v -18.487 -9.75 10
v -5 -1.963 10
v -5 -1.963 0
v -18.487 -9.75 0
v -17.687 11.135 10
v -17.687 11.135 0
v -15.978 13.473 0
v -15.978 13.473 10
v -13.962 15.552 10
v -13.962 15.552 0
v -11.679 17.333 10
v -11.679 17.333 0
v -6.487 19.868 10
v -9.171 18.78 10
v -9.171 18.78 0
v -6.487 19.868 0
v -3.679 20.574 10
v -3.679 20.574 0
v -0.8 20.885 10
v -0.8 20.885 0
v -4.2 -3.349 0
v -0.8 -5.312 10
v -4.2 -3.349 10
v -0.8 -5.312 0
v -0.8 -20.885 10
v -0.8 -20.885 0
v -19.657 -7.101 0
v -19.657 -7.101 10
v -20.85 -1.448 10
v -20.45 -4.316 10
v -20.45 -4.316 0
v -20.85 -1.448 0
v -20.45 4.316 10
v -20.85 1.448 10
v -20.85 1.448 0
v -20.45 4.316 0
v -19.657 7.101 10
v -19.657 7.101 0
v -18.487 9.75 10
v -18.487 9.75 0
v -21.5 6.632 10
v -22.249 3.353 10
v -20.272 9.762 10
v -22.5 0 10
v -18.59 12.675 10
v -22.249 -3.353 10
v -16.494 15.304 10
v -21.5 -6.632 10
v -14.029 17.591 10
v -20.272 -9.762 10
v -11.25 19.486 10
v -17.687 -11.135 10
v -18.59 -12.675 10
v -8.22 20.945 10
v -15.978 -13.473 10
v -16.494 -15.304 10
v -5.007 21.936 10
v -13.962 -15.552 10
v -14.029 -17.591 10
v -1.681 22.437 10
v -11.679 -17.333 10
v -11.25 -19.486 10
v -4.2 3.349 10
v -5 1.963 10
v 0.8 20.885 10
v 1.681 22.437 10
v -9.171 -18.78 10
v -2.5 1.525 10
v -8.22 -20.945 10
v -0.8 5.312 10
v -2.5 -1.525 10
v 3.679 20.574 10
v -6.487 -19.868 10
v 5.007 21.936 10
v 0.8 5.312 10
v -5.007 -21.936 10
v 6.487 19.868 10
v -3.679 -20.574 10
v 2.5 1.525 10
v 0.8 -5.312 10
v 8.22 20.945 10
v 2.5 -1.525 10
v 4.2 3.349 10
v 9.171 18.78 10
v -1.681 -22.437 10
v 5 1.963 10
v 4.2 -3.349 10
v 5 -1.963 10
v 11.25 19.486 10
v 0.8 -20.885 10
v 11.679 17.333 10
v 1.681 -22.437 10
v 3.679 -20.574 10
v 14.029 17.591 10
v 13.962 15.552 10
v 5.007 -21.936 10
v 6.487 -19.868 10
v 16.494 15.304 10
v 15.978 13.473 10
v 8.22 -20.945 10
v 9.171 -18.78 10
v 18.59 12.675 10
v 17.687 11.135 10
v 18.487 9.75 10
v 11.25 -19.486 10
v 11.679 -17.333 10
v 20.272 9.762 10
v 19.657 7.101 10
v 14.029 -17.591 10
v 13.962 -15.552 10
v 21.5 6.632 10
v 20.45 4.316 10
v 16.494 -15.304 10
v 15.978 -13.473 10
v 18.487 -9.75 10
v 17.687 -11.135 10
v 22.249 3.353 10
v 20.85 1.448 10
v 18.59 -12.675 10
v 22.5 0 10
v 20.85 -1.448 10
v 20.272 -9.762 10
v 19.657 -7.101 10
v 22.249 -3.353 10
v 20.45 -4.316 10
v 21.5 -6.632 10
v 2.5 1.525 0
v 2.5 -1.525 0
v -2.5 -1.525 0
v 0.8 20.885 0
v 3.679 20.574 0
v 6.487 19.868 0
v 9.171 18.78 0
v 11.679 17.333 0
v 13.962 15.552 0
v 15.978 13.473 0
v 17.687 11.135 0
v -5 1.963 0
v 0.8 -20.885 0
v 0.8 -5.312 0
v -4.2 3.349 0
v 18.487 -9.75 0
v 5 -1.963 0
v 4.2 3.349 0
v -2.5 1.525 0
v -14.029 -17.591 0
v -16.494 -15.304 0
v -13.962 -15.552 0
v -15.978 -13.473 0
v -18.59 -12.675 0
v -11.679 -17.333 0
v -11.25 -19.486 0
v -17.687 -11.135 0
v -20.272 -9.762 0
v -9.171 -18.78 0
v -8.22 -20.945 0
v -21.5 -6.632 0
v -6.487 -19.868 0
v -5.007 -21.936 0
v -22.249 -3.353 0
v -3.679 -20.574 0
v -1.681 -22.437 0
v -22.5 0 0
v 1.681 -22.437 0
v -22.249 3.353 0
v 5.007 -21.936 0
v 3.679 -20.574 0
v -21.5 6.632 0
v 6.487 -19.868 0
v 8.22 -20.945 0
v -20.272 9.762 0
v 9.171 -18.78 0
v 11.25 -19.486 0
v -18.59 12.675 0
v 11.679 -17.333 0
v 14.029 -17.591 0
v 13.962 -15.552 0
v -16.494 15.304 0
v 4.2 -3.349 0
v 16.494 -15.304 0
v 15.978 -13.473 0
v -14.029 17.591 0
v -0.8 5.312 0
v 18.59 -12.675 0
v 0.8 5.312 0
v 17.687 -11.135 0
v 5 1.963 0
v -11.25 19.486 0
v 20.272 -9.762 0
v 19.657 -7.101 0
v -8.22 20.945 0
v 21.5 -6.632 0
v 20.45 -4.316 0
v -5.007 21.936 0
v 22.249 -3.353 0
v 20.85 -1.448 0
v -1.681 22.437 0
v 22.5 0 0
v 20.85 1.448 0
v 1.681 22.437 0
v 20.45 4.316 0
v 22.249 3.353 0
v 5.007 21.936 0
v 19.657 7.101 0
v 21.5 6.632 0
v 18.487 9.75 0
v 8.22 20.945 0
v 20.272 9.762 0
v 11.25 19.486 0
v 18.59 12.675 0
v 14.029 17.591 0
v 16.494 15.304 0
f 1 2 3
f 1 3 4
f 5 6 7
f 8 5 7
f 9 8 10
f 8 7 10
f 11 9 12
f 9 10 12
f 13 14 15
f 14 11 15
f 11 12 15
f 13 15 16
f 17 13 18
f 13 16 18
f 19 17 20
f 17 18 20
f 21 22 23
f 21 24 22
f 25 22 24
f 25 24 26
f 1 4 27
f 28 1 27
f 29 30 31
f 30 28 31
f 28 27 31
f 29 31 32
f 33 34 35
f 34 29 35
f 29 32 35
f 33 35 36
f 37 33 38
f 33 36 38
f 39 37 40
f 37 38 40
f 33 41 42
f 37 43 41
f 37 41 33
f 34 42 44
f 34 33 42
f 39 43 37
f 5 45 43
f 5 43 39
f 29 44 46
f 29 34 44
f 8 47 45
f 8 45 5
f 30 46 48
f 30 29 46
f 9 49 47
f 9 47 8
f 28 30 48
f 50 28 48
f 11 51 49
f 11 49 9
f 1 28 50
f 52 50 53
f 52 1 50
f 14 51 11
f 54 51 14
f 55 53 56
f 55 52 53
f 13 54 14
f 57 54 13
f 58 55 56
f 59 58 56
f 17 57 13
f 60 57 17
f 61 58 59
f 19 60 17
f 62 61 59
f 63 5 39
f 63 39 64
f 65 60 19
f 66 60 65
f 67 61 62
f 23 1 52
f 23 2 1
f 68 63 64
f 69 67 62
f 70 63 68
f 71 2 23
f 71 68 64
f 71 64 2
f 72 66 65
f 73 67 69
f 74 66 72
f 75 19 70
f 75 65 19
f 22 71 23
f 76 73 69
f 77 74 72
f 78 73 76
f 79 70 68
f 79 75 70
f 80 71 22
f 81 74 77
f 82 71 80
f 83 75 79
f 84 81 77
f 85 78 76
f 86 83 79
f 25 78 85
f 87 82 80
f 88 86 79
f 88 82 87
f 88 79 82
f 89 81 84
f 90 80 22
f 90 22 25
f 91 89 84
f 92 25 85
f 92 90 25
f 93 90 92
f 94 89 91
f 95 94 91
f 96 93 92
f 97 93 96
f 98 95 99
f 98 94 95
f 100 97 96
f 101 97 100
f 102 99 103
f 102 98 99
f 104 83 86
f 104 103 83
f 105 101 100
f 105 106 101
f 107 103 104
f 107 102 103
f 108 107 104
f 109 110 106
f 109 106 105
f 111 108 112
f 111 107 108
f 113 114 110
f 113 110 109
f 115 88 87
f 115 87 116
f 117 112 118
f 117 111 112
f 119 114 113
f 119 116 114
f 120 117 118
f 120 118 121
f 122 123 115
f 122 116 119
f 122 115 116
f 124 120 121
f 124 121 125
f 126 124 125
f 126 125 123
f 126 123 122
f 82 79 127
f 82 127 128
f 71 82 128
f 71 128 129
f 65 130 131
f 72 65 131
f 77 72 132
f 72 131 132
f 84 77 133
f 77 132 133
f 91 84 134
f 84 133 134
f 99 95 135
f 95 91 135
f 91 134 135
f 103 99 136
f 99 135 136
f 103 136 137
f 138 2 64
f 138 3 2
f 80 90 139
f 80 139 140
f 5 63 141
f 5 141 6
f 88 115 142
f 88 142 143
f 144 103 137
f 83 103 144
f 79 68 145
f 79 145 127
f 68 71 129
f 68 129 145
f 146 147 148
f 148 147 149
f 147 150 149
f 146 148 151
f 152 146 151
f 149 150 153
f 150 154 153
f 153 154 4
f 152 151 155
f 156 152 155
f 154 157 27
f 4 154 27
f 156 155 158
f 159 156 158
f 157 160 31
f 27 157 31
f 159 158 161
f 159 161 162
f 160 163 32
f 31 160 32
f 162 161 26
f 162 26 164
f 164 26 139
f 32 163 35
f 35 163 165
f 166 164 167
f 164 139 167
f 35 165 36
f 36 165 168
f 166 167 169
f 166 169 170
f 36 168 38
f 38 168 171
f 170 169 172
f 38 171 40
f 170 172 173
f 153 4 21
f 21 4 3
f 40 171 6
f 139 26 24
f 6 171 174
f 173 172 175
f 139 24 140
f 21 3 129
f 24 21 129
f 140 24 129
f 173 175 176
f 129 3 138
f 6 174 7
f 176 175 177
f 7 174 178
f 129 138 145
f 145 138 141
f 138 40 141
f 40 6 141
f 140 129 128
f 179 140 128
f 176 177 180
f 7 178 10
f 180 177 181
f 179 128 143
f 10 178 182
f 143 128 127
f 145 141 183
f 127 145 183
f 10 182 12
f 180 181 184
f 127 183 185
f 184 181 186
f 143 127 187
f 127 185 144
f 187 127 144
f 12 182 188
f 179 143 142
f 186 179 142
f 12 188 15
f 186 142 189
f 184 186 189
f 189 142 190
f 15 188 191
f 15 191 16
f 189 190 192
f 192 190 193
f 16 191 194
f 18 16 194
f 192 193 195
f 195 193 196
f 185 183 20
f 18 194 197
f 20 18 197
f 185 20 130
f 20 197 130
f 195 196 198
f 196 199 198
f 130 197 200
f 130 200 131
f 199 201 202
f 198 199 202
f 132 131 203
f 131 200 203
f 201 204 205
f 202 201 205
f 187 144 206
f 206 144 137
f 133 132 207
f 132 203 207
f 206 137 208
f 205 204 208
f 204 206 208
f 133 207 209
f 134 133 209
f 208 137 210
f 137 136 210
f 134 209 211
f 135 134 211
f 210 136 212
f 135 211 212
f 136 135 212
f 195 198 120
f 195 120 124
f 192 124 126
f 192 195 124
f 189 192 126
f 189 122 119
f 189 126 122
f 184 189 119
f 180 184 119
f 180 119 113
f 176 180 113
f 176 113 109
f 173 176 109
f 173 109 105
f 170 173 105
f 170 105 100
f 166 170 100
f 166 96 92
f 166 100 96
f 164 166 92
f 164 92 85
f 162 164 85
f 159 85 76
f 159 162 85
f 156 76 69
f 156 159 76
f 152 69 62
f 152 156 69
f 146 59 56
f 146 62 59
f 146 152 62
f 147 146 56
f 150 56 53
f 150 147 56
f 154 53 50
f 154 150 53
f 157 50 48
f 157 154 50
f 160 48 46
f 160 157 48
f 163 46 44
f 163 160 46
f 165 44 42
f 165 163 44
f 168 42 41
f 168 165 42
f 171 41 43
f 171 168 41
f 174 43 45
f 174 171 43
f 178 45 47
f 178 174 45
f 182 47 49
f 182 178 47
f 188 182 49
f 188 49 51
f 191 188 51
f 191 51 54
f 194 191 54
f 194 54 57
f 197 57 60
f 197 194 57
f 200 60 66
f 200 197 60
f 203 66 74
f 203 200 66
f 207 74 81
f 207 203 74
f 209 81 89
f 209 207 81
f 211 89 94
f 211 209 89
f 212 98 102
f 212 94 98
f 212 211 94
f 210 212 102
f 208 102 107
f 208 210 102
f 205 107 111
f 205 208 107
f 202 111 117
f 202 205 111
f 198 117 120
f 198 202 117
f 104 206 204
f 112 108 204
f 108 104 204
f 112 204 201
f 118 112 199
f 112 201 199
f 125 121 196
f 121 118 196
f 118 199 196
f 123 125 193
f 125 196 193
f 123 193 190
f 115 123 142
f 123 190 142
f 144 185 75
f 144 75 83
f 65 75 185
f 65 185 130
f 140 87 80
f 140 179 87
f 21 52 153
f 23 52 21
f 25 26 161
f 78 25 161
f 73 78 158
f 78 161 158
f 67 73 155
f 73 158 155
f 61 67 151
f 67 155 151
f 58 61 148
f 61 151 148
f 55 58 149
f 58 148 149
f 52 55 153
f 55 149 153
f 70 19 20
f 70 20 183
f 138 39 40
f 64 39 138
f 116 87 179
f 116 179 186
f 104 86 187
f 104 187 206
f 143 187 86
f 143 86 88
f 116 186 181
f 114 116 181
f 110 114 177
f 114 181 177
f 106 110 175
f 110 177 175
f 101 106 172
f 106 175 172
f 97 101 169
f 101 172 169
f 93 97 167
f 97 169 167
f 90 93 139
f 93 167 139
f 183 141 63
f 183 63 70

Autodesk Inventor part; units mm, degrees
ref_plane "YZ Plane" through (0, 0, 0) normal (1, 0, 0) x (0, 1, 0)
ref_plane "XZ Plane" through (0, 0, 0) normal (0, 1, 0) x (-1, 0, 0)
ref_plane "XY Plane" through (0, 0, 0) normal (0, 0, 1) x (1, 0, 0)
sketch "スケッチ1" plane through (0, 0, 0) normal (0, 0, 1) x (1, 0, 0)
  line L0 (0, -5.7735) -> (-5, -2.8868)
  line L1 (-5, -2.8868) -> (-5, 2.8868)
  line L2 (-5, 2.8868) -> (0, 5.7735)
  line L3 (0, 5.7735) -> (5, 2.8868)
  line L4 (5, 2.8868) -> (5, -2.8868)
  line L5 (5, -2.8868) -> (0, -5.7735)
  circle A0 centre (0, 0) radius 22.5
  circle A1 centre (0, 0) radius 20.9
  dimension "HUB_D" = 10
  dimension "DIA" = 45
  dimension "RIM_THIN" = 1.6
extrude "ハブ＆リム" add sketch "スケッチ1" along normal blind 10
sketch "スケッチ2" plane through (0, 0, 10) normal (0, 0, 1) x (1, 0, 0)
  line L0 (-0.8, 0) -> (0.8, 0)
  line L1 (0.8, 0) -> (0.8, 20.9)
  line L2 (0.8, 20.9) -> (-0.8, 20.9)
  line L3 (-0.8, 20.9) -> (-0.8, 0)
  line L4 (0, 0) -> (0, 25.5289) construction
  circle A0 centre (0, 0) radius 20.9 construction
  point P0 (0, 20.9)
  dimension "SPOKE_THIN" = 1.6
extrude "スポーク" add sketch "スケッチ2" against normal up to surface (10 mm away)
pattern_circular "円形状パターン1" count 6 over 360 about axis through (0, 0, -10) along (0, 0, 1) of "スポーク"
sketch "スケッチ3" plane through (0, 0, 10) normal (0, 0, 1) x (1, 0, 0)
  line L0 (-2.5, 1.525) -> (2.5, 1.525)
  line L1 (2.5, 1.525) -> (2.5, -1.525)
  line L2 (2.5, -1.525) -> (-2.5, -1.525)
  line L3 (-2.5, -1.525) -> (-2.5, 1.525)
  point P0 (0, 0)
  point P1 (0, 1.525)
  point P2 (2.5, 0)
  dimension "d11" = 5
  dimension "d12" = 3.05
extrude "押し出し3" cut sketch "スケッチ3" against normal through all
properties part number "Wheel-D45B"
